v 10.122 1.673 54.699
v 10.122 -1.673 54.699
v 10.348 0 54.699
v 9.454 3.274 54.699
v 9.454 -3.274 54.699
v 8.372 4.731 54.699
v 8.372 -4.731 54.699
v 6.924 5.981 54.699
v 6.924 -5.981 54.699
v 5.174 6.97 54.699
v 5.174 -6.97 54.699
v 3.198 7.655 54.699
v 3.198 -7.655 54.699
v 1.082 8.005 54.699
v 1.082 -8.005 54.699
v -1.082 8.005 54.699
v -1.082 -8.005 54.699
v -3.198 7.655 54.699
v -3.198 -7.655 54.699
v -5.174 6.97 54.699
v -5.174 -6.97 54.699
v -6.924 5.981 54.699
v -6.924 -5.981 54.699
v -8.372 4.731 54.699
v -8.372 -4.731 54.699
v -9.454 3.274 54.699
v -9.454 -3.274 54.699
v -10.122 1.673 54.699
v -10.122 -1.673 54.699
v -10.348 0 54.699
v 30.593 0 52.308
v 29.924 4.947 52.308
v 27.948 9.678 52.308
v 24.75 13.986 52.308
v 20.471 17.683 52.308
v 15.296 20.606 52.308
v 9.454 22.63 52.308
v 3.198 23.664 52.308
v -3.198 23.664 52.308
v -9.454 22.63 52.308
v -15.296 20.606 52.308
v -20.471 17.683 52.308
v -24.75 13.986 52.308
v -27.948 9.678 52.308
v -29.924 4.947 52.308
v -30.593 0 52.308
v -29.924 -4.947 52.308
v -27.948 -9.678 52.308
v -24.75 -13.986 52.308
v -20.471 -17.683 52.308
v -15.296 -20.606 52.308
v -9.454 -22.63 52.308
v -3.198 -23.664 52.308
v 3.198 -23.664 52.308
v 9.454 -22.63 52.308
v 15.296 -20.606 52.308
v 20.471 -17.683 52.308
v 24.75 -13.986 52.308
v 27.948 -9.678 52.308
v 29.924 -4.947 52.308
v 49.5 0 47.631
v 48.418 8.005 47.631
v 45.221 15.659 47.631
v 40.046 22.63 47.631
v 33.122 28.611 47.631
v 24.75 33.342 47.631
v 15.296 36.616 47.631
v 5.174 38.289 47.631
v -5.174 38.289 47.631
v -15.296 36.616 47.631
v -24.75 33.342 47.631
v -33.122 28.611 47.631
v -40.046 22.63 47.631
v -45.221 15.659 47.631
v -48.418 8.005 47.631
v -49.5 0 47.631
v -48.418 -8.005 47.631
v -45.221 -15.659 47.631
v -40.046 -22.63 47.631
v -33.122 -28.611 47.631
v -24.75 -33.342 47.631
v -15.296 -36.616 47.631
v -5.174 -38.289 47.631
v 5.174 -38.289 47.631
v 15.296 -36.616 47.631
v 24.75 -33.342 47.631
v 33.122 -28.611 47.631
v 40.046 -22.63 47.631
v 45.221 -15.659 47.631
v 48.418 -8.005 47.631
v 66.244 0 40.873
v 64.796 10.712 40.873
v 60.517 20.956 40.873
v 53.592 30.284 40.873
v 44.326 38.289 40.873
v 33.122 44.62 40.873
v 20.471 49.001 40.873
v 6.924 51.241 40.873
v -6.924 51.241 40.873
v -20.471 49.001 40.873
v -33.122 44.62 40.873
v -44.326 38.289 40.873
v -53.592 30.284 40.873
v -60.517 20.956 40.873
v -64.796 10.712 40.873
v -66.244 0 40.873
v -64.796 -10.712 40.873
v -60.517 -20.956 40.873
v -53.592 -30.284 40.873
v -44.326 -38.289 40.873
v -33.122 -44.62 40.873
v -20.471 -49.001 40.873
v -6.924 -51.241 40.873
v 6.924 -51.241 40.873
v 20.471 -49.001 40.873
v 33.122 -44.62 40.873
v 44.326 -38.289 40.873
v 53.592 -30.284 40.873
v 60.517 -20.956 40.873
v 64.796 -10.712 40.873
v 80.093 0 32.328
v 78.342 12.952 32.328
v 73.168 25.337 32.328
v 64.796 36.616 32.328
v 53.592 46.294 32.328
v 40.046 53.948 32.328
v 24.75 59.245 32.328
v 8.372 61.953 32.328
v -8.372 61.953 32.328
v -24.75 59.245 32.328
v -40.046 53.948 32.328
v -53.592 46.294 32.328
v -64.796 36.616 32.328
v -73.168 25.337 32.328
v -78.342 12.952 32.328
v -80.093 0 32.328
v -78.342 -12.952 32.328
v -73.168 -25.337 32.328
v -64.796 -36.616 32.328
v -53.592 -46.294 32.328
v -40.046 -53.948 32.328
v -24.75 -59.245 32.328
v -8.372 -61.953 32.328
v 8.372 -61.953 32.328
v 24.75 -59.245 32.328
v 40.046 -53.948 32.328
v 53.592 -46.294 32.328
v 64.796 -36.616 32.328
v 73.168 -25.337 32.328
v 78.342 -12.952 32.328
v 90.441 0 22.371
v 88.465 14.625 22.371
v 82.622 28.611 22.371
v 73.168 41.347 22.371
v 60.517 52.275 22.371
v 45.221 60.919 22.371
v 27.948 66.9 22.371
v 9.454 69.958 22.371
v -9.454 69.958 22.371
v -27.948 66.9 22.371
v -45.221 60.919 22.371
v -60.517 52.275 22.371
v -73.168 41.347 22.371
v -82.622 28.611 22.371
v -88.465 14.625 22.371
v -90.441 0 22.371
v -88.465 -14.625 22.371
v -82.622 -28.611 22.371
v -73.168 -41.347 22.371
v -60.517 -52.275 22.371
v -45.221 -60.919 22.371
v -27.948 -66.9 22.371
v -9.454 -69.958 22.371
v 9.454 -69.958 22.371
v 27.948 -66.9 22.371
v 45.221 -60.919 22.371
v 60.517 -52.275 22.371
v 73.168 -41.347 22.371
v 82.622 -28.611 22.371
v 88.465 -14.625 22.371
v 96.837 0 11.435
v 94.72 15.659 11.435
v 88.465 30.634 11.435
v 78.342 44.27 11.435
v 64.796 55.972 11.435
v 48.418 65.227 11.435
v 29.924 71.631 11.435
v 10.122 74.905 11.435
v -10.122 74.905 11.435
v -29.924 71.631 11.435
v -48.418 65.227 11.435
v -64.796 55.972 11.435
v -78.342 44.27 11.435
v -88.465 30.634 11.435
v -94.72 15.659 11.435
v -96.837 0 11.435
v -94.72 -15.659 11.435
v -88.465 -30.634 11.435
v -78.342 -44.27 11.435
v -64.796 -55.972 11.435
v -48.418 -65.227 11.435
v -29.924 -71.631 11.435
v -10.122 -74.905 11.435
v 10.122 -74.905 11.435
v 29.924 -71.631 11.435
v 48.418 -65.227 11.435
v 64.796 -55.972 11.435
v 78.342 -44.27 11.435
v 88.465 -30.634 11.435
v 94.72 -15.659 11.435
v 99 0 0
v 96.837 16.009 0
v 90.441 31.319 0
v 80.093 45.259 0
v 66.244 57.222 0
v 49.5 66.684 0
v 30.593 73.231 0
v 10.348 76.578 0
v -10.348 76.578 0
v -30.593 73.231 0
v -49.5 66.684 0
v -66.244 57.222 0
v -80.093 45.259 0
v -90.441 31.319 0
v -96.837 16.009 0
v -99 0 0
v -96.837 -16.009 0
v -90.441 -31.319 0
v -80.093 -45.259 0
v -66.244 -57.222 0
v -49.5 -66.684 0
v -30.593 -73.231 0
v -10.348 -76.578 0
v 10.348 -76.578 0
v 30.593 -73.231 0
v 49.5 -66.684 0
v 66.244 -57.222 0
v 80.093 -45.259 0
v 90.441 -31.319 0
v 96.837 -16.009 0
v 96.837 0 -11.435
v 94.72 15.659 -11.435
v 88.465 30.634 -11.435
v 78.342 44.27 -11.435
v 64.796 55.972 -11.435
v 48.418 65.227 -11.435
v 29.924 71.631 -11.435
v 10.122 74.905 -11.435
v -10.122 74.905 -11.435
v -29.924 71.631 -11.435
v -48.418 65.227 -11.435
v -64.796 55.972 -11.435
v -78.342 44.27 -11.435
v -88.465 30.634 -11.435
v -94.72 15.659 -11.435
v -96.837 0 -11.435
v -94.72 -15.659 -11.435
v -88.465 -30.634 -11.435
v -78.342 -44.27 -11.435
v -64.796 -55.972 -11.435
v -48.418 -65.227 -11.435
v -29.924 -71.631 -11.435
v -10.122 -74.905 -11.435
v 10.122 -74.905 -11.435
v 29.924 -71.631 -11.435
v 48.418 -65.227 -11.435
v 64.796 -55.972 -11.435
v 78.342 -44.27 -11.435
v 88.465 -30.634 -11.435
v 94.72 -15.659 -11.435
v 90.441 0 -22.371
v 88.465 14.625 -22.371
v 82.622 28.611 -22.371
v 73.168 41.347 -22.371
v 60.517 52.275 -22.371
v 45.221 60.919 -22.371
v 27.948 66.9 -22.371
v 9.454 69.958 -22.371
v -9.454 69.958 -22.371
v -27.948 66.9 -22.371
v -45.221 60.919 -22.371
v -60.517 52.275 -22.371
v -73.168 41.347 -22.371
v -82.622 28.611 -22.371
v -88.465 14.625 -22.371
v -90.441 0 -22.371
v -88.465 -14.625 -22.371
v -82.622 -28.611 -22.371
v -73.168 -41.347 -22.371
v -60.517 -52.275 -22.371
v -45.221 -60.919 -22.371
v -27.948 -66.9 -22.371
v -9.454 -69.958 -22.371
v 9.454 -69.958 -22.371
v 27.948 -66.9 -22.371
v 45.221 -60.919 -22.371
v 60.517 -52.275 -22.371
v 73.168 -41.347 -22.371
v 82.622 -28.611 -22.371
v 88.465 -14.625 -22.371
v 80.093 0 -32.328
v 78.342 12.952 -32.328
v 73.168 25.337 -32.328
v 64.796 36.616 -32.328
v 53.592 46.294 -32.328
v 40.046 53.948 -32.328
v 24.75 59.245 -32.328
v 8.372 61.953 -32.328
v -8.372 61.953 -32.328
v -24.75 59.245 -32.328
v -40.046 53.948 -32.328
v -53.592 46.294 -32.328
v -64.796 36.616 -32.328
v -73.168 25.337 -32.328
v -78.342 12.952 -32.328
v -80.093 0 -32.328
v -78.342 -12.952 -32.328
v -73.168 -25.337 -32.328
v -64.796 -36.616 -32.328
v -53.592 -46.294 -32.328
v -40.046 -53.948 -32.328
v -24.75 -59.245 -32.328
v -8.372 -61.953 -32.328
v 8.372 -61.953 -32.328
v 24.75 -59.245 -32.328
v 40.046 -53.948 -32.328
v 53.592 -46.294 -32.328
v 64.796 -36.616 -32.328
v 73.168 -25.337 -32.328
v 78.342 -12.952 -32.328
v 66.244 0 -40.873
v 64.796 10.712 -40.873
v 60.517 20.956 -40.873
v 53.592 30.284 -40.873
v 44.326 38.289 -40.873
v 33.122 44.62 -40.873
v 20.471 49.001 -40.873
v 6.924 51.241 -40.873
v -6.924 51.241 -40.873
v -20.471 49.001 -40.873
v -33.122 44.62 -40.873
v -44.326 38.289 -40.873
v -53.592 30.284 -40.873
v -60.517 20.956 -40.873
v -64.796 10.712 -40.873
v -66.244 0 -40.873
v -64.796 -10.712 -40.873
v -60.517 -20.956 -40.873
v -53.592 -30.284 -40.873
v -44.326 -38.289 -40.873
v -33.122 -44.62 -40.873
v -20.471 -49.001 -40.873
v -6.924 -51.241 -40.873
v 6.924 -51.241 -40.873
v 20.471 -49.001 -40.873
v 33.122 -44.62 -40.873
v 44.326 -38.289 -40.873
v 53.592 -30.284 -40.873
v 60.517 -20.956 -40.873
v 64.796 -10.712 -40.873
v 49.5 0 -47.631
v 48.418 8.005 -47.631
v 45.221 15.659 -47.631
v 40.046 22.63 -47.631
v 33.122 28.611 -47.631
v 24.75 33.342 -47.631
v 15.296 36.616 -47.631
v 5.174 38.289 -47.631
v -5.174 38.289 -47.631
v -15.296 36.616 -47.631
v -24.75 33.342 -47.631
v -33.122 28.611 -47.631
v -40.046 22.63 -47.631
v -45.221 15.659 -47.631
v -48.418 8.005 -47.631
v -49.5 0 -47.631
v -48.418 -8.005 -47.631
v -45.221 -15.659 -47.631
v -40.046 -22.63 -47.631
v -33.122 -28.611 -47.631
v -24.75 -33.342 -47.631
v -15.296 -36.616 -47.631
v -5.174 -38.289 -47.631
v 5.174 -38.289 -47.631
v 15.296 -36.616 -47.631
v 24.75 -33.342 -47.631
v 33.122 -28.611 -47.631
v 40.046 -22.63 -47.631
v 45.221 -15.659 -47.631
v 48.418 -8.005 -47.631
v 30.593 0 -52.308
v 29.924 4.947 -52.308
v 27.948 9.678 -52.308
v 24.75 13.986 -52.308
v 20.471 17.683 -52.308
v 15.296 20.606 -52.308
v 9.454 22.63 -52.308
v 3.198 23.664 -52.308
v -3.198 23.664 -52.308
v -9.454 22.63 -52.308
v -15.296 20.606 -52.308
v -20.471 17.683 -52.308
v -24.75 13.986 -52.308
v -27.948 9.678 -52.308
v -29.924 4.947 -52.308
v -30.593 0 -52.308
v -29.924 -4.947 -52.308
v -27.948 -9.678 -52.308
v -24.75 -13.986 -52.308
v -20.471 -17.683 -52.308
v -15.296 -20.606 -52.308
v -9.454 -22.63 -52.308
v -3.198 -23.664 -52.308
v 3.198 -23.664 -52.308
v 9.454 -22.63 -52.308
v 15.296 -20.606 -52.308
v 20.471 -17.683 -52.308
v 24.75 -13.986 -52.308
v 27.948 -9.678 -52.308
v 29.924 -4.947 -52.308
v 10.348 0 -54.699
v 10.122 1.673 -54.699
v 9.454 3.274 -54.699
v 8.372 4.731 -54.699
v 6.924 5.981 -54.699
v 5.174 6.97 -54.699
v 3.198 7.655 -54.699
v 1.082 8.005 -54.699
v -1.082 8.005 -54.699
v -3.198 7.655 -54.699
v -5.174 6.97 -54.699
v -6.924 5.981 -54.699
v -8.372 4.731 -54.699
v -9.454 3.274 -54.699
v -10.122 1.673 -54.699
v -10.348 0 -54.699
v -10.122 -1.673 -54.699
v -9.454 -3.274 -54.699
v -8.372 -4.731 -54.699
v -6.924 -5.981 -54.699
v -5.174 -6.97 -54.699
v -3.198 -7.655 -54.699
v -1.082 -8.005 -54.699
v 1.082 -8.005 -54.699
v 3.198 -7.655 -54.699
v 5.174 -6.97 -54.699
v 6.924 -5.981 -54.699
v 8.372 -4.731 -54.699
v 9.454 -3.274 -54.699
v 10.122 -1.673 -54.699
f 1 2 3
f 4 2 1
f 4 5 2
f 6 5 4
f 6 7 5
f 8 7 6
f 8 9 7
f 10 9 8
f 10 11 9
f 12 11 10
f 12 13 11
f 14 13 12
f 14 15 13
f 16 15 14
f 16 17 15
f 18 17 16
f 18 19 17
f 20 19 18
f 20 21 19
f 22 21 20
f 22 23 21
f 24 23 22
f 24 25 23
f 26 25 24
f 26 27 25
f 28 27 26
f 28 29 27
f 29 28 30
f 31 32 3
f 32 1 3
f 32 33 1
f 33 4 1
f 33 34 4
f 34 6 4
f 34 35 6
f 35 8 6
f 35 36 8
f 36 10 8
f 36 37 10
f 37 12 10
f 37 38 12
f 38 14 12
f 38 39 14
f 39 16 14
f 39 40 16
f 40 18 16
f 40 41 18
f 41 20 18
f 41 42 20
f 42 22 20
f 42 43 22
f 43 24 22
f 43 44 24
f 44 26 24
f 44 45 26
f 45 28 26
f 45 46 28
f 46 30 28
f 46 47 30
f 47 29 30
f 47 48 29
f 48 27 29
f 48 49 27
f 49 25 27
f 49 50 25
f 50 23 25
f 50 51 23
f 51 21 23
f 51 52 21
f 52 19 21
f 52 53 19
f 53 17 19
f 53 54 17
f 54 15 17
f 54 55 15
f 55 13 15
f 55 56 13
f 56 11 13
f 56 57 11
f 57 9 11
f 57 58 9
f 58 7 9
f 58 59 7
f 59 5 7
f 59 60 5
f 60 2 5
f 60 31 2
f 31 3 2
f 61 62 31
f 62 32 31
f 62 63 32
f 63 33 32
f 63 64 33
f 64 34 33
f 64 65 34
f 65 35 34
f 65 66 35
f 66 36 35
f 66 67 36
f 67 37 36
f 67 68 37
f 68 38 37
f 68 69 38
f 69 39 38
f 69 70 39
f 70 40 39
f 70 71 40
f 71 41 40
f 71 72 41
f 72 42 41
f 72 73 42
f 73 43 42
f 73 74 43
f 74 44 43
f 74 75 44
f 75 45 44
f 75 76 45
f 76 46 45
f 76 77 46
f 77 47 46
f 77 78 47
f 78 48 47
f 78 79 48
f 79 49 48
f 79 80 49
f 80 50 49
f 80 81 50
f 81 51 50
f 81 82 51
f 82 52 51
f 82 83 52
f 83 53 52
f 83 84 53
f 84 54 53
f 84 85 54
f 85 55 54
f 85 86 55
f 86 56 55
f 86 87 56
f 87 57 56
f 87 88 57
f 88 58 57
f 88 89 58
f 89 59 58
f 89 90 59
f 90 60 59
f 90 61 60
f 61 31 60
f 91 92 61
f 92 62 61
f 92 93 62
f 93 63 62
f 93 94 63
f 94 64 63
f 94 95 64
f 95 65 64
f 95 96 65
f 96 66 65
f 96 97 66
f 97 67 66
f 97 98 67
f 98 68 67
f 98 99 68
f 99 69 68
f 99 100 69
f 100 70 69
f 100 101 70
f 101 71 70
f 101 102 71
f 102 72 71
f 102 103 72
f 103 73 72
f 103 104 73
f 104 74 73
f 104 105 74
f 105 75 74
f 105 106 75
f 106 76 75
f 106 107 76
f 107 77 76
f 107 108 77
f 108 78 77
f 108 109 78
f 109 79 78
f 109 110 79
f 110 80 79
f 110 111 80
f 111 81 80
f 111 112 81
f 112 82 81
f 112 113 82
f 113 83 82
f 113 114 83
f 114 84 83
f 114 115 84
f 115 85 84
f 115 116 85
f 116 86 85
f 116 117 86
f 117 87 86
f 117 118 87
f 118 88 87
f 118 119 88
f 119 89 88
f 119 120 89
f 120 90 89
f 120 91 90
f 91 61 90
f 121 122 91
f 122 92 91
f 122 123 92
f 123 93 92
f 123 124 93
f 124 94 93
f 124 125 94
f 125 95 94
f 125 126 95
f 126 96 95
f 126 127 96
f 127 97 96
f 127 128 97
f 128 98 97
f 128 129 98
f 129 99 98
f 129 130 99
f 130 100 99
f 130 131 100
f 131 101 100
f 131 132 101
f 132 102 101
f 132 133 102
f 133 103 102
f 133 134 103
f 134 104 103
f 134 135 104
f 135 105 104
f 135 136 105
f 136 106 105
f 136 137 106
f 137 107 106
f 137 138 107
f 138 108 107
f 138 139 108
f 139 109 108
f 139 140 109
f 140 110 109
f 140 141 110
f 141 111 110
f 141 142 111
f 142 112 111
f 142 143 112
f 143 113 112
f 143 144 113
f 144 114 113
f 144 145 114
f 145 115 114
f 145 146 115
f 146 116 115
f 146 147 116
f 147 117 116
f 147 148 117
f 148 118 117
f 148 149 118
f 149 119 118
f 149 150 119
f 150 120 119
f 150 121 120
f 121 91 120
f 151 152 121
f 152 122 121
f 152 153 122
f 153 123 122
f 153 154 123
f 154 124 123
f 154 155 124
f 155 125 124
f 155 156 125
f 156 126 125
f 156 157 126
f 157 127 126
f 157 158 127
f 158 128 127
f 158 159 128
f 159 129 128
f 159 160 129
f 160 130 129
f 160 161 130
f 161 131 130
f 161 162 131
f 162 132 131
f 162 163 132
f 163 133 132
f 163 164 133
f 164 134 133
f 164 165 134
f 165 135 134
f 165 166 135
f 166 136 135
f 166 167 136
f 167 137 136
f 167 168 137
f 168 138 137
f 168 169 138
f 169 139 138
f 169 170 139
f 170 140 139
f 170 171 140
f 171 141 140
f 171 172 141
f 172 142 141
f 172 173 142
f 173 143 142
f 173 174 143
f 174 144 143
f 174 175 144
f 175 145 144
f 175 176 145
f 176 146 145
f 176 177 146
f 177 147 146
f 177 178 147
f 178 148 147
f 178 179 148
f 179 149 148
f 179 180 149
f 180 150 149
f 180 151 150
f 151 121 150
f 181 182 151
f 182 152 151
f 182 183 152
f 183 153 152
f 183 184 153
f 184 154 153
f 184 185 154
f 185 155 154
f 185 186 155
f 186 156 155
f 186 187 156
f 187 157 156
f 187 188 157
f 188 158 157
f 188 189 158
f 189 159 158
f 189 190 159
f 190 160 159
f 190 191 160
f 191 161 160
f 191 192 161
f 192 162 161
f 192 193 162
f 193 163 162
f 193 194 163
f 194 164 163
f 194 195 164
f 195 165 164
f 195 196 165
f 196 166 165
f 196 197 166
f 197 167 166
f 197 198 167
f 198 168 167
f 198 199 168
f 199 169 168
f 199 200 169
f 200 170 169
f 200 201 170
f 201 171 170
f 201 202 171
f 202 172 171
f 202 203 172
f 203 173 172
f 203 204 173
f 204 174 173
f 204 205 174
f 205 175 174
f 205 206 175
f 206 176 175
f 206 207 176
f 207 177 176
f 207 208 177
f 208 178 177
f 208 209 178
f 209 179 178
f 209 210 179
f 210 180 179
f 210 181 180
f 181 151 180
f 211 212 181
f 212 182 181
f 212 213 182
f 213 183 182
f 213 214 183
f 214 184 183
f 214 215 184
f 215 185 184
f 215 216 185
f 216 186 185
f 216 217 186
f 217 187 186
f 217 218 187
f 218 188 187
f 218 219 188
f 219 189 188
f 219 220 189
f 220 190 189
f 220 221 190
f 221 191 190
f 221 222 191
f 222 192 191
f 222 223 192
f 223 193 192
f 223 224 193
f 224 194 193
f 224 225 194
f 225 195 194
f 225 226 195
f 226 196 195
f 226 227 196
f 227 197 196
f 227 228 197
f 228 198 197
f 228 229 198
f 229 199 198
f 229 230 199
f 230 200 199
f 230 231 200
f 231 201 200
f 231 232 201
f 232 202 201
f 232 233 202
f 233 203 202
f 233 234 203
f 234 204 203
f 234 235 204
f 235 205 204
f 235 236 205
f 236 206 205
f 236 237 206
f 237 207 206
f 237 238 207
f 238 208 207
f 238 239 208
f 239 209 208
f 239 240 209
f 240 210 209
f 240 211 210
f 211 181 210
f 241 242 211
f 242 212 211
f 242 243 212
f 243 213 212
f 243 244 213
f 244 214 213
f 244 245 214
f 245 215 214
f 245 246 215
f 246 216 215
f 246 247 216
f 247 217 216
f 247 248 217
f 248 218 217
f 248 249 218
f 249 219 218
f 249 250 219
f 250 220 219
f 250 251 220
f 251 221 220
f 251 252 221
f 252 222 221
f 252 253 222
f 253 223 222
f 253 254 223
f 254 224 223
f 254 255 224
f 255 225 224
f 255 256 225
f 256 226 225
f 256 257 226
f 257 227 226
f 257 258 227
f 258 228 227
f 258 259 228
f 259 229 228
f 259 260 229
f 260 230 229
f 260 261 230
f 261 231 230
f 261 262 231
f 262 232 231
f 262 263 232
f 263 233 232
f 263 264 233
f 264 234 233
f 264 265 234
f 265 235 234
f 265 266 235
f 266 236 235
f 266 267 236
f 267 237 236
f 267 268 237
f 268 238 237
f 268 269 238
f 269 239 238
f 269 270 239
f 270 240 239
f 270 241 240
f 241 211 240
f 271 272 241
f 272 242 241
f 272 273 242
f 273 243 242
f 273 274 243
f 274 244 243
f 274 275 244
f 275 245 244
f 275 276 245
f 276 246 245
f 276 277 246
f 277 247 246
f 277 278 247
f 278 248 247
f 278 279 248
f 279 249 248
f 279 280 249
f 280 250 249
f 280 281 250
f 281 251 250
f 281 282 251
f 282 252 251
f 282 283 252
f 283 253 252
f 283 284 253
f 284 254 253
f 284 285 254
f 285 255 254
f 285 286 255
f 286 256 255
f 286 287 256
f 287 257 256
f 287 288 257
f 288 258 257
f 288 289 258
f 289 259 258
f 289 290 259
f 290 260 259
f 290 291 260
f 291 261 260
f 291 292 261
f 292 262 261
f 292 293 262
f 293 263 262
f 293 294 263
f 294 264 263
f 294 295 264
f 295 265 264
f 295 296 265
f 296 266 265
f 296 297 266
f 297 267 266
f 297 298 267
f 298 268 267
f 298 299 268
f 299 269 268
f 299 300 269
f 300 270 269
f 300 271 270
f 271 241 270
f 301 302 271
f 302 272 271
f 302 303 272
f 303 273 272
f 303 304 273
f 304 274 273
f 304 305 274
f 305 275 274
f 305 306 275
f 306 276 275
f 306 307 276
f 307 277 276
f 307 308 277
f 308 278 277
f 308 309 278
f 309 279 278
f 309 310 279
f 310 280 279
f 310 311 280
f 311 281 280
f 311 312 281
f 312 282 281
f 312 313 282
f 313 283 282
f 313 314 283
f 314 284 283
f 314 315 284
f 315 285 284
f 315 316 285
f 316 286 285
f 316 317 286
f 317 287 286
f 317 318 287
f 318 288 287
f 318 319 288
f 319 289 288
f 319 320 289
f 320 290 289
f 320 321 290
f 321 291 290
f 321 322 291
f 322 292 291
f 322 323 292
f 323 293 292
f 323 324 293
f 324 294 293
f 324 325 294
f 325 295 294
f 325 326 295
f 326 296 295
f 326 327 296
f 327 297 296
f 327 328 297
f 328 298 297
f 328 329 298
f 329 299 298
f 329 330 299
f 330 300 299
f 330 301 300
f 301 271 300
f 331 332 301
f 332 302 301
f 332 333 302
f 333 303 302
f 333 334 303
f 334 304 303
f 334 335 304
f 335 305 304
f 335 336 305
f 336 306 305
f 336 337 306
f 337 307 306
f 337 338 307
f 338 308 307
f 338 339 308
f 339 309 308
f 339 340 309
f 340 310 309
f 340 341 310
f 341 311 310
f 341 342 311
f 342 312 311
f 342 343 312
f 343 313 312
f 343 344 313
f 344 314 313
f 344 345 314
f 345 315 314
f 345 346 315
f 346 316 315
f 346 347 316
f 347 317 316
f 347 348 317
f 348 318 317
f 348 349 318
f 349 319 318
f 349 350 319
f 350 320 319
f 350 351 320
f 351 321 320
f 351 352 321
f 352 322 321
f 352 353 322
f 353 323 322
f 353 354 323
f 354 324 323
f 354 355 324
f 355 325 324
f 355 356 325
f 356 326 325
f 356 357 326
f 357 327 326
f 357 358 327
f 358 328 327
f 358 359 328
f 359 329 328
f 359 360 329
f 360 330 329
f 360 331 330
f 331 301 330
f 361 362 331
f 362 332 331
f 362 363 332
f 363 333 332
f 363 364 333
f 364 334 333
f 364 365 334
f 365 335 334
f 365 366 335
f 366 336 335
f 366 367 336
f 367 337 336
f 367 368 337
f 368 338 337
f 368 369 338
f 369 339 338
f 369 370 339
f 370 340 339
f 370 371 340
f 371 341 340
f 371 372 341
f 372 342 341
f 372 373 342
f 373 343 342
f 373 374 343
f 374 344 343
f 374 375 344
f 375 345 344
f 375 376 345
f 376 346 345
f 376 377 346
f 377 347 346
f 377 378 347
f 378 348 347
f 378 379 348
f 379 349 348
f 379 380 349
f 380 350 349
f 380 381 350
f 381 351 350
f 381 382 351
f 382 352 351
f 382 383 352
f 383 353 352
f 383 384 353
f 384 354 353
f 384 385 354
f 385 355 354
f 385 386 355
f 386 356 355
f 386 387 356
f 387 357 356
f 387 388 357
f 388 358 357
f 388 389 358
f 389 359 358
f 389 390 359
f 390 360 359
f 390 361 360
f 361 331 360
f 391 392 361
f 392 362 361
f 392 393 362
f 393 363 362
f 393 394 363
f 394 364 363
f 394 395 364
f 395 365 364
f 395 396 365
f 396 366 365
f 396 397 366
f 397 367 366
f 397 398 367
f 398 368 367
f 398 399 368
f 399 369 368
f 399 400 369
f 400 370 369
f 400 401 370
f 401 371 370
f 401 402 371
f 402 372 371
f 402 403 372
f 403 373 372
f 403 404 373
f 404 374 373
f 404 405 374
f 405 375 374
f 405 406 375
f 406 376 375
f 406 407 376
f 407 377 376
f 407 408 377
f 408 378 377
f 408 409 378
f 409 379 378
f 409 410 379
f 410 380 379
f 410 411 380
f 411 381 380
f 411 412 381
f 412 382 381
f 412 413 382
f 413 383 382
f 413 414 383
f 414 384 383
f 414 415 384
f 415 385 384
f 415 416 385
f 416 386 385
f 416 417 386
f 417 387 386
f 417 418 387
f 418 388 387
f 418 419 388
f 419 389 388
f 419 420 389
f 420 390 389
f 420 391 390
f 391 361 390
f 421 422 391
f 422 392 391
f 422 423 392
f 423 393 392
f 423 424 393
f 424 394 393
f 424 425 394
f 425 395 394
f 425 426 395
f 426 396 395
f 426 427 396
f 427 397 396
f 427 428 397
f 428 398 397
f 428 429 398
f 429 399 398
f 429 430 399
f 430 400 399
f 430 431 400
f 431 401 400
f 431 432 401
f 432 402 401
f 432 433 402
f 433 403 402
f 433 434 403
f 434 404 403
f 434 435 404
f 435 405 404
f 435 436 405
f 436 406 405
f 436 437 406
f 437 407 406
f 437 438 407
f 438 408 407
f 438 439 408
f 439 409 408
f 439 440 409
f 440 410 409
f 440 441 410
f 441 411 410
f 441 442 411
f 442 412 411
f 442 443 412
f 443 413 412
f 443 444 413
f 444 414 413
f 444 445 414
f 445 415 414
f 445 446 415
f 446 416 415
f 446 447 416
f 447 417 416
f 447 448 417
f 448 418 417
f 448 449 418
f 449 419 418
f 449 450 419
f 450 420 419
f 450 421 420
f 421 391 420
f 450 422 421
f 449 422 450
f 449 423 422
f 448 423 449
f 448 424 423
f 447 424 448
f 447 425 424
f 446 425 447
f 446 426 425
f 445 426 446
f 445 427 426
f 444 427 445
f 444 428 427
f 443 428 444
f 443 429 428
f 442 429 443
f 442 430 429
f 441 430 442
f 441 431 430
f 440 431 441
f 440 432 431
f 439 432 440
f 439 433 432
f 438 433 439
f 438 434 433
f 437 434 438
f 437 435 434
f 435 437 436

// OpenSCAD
// Generated by SolidPython 1.0.1 on 2020-07-29 00:46:48


scale(v = [9, 7, 5]) {
	sphere(r = 11);
}
/***********************************************
*********      SolidPython code:      **********
************************************************
 
# import packages: SolidPython
from solid import *
from solid.utils import *
from itertools import chain, combinations, permutations


class Resize:

    def __init__(self, scad_file):
        self.scad_file = scad_file
        #self.scad_file = import_scad(scad_file)
        # cone/cylinder param:
        self.r1 = 0
        self.r2 = 0
        self.h = 0
        # rectangular prism param:
        self.w = 0
        self.l = 0
        # ellipse param:
        self.r = 0

    # import OpenScad code (file name corresponds to shape)


    # classify shape + parameters
    def assign(self, param1, param2, param3):
        if self.scad_file == 'cone.scad':
            self.r1 = param1
            self.r2 = param2
            self.h = param3
        elif self.scad_file == 'cylinder.scad':
            self.r1 = param1
            self.r2 = param2
            self.h = param3
        elif self.scad_file == 'rectangularPrism.scad':
            self.h = param1
            self.l = param2
            self.w = param3
        else:
            self.r = param1
            self.h = param2

    # resize parameters
    def iterate(self):
        x = range(3, 20, 2)
        i = 1
        if self.scad_file == 'cone.scad':
            tempList = list(permutations(x, 2))
            for temp in tempList:
                param1 = temp[0]
                param2 = temp[1]
                filepath = 'produced_scad_files/' + 'cone' + str(param1) + '_' + str(param2) + '_' + '.scad'
                scad_render_to_file(cylinder(h=param1, r1=param2, r2=0), filepath)

        elif self.scad_file == 'cylinder.scad':
            tempList = list(permutations(x, 3))
            for temp in tempList:
                param1 = temp[0]
                param2 = temp[1]
                filepath = 'produced_scad_files/' + 'cylinder' + str(param1) + '_' + str(param2) + '_' + '.scad'
                scad_render_to_file(cylinder(h=param1, r1=param2, r2=param2), filepath)

        elif self.scad_file == 'rectangularPrism.scad':
            tempList = list(permutations(x, 3))
            for temp in tempList:
                param1 = temp[0]
                param2 = temp[1]
                param3 = temp[2]
                filepath = 'produced_scad_files/' + 'rectangularPrism' + str(param1) + '_' + str(param2) + '_' + str(
                    param3) + '.scad'
                scad_render_to_file(cube(size=(param1, param2, param3)), filepath)

        elif self.scad_file == 'ellipse.scad':
            tempList = list(permutations(x, 4))
            for temp in tempList:
                param1 = temp[0]
                param2 = temp[1]
                param3 = temp[2]
                param4 = temp[3]
                filepath = 'produced_scad_files/' + 'ellipse' + str(param1) + '_' + str(param2) + '_' + str(param3) + '_' + str(param4) + '.scad'
                scad_render_to_file(scale([param1, param2, param3])(sphere(r=param4)), filepath)

    def render_to_scadfile(self):
        scad_render_to_file(scad, 'example.scad') 
 
************************************************/
